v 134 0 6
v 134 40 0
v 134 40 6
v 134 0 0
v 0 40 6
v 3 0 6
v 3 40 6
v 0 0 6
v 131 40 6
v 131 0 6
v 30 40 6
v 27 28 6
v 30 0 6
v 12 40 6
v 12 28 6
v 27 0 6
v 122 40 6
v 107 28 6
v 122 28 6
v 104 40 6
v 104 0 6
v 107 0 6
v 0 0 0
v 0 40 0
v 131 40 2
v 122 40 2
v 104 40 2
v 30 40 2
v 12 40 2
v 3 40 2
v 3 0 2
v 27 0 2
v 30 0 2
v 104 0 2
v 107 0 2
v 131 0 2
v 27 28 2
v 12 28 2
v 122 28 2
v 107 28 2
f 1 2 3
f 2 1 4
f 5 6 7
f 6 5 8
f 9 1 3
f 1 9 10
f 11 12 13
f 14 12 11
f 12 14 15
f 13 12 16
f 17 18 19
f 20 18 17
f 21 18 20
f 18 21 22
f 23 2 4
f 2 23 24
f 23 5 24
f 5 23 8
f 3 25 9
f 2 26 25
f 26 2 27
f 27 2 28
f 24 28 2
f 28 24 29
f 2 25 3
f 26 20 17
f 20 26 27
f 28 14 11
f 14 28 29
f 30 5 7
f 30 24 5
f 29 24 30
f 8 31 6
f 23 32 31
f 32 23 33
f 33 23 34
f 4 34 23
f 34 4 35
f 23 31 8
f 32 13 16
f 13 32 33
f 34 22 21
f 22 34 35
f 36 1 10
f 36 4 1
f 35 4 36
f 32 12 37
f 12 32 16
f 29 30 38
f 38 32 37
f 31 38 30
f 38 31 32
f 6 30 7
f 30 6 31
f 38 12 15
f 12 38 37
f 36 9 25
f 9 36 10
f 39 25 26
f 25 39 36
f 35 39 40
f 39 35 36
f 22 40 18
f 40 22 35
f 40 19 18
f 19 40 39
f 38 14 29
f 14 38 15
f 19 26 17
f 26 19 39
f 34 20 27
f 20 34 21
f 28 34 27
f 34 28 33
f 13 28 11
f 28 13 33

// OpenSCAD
$fn = 100;

roller_width = 24;
rail_width = 40;
rail_height = 6;
rail_gap = 3;

bump_length = 15;
bump_width = 11;

gap1 = 59;
gap2 = 98;


length = gap2 + roller_width + ( 2 * rail_height );

difference() {
    cube([length, rail_width, rail_height]);
    
    translate([rail_gap, -1, 2])
        cube([roller_width, rail_width - bump_width, 200]);
    translate([length - roller_width - rail_gap, -1, 2])
        cube([roller_width, rail_width - bump_width, 200]);
  
    translate([rail_gap, -1, 2])
        cube([roller_width - bump_length, rail_width + 2, 200]);
    translate([length - roller_width - rail_gap + bump_length, -1, 2])
        cube([roller_width - bump_length, rail_width + 2, 200]);
        
    translate([(rail_gap * 2) + roller_width, -1, 2])
        cube([length - (roller_width * 2) - (rail_gap * 4), rail_width + 2, 200]);
 }
 
// translate([-1, rail_height, rail_height / 2])
//        cube([roller_width, 200, 200]);
